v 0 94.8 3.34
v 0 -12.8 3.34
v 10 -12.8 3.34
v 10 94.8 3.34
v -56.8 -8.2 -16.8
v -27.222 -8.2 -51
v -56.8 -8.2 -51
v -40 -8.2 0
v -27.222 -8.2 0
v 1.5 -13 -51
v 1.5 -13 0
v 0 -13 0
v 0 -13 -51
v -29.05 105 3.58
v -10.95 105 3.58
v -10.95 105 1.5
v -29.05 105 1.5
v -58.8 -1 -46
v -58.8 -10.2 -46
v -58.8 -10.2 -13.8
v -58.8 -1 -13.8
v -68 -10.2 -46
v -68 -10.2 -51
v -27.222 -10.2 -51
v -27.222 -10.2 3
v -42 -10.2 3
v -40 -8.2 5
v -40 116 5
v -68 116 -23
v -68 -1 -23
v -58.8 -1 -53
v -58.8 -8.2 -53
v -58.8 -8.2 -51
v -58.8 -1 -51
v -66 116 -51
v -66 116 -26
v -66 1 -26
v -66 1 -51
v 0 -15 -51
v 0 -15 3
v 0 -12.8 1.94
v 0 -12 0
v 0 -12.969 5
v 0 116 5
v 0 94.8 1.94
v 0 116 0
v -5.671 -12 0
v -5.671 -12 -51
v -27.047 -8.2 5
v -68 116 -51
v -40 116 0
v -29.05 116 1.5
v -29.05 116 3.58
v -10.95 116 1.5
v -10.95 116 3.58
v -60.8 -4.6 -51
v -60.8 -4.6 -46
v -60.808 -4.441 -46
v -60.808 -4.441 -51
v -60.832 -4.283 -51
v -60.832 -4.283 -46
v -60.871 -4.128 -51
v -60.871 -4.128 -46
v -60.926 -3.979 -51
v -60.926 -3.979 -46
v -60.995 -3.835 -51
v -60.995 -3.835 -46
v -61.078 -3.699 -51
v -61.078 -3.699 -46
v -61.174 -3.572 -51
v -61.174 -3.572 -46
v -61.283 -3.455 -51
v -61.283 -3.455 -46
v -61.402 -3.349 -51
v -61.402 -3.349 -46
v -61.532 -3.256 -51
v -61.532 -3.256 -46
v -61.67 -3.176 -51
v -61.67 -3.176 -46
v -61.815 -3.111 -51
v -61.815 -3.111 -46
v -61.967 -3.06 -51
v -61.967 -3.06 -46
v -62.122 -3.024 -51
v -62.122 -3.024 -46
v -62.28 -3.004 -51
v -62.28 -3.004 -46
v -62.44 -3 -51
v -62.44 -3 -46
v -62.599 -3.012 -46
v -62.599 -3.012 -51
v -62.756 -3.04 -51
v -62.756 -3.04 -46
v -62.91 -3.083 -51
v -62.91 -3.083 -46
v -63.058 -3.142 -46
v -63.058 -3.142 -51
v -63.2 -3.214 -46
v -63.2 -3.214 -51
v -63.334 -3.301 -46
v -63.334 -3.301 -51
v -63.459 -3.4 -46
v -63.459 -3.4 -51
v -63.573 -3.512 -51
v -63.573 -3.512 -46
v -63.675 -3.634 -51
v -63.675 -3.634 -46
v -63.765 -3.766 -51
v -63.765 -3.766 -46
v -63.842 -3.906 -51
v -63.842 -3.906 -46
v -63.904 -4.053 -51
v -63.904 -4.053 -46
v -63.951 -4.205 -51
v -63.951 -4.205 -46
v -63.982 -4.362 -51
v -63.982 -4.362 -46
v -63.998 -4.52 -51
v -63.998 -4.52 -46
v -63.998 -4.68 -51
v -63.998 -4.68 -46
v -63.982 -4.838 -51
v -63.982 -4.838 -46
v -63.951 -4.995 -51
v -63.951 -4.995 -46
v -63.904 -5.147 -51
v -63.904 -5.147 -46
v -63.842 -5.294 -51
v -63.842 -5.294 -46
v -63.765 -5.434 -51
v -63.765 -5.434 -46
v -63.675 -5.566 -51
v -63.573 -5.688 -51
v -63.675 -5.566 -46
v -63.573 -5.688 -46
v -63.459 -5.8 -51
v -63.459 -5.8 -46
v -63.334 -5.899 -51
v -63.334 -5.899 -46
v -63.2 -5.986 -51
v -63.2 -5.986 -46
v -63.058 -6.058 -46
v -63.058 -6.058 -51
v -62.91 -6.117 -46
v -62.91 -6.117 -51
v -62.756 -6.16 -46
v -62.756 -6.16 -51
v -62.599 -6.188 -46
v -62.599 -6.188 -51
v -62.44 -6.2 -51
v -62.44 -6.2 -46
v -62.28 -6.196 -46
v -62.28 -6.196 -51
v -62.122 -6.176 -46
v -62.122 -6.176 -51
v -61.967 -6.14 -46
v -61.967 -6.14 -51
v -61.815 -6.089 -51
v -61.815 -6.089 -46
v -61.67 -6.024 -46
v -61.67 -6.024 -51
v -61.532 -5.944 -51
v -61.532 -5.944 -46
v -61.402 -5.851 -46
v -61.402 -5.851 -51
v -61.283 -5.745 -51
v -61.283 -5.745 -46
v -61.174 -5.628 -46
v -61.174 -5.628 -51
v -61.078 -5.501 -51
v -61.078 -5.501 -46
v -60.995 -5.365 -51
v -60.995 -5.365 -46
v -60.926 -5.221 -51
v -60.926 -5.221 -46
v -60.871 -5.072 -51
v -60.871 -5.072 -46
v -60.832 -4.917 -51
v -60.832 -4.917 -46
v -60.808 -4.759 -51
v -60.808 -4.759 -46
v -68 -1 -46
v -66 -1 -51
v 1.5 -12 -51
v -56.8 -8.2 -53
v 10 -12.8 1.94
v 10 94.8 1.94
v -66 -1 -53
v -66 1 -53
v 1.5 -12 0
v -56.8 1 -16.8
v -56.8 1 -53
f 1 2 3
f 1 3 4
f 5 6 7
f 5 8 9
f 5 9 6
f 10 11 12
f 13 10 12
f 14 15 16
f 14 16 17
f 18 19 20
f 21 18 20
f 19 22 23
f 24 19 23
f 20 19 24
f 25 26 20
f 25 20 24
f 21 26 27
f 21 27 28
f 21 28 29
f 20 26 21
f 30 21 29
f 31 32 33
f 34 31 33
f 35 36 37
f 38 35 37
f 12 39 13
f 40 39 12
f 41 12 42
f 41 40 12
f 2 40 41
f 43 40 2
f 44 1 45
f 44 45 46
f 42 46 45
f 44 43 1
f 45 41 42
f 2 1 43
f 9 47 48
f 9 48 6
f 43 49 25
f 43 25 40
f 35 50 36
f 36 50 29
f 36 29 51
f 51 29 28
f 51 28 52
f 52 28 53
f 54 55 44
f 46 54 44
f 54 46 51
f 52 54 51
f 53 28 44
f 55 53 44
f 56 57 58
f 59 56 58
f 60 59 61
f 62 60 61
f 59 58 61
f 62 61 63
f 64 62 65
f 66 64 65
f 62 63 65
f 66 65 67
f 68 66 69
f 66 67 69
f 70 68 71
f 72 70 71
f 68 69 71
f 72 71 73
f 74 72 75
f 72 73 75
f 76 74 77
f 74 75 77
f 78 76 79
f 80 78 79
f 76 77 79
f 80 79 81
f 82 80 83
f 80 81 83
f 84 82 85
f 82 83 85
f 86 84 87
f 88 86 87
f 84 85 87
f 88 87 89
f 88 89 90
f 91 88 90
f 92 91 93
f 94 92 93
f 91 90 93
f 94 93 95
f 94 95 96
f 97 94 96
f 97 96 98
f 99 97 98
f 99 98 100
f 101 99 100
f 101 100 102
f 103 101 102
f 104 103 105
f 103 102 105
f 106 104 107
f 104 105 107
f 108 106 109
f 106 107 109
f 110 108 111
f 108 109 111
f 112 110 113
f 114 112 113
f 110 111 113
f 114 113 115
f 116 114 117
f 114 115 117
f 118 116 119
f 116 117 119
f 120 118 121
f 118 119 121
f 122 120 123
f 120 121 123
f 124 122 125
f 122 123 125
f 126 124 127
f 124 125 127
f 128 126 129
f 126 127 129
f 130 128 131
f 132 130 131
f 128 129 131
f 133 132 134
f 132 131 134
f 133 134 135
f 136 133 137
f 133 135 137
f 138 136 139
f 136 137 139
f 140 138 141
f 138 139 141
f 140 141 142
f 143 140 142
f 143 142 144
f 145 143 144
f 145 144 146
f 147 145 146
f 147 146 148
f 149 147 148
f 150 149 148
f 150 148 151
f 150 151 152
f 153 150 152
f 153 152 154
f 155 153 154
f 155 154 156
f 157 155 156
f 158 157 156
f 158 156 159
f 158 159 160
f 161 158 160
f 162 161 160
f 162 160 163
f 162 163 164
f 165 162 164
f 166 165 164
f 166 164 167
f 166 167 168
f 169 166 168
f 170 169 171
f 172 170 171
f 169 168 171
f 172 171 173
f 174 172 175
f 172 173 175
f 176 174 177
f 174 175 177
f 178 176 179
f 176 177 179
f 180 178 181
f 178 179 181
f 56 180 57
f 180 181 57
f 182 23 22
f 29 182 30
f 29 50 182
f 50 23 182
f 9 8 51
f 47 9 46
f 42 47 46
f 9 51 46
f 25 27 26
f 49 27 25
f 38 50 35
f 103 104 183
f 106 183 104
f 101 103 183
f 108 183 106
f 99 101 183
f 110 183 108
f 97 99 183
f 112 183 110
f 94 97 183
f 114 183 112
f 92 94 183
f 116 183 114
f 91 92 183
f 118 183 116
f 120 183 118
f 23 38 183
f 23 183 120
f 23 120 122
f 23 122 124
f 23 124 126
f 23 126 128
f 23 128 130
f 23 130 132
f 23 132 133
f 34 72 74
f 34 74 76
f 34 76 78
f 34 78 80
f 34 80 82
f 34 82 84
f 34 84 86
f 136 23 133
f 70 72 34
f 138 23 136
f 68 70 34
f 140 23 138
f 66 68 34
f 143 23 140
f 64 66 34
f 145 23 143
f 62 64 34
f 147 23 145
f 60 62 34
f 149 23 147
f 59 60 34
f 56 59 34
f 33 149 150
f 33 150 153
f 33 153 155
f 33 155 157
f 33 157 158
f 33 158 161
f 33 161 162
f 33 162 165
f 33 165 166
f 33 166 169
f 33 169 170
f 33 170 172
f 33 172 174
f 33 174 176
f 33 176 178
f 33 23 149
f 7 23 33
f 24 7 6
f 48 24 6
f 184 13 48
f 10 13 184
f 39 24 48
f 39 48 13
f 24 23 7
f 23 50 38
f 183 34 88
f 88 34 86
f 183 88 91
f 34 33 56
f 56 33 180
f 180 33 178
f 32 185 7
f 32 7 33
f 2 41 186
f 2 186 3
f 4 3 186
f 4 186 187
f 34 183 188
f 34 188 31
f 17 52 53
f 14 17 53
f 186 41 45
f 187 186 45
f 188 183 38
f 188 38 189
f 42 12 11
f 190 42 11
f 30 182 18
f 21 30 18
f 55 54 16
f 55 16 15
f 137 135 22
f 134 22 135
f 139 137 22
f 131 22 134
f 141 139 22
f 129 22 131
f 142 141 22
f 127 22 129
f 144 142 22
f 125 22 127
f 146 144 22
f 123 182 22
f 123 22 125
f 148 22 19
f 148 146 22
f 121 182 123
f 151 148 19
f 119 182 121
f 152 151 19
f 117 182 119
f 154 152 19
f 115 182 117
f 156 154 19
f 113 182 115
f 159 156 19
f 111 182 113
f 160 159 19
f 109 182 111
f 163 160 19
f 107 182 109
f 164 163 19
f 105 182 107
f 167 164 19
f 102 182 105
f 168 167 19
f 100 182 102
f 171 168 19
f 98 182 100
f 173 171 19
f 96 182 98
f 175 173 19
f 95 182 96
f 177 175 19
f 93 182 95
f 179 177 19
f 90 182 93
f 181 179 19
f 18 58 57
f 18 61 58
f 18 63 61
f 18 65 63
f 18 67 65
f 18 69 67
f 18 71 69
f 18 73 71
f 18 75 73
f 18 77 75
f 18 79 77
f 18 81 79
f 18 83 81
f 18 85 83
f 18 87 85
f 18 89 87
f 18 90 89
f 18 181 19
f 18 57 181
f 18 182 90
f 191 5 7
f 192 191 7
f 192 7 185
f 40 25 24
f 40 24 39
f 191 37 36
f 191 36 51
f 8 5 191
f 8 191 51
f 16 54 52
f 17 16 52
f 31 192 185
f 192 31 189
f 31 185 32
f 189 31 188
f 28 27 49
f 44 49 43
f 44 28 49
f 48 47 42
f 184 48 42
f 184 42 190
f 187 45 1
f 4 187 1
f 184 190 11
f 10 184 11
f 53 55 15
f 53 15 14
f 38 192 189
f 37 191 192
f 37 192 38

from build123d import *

# Parameters (mm, degrees)
SKETCH_1_W      = 40
SKETCH_1_H      = 116
PAD_DEPTH       = 5
PAD001_DEPTH    = 5
PAD002_DEPTH    = 126.2
SKETCH005_W     = 9.2
SKETCH005_H     = 9.2
POCKET_DEPTH    = 33.001
PAD004_DEPTH    = 2
PAD005_DEPTH    = 51
SKETCH006_W     = 2
SKETCH006_H     = 117
PAD006_DEPTH    = 23
PAD007_DEPTH    = 2
PAD008_DEPTH    = 9.2
SKETCH009_W     = 9.2
SKETCH009_H     = 5
PAD009_DEPTH    = 9.2
SKETCH010_R     = 1.6
POCKET001_DEPTH = 5
SKETCH011_W     = 107.6
SKETCH011_H     = 1.4
PAD010_DEPTH    = 10
SKETCH012_W     = 18.1
SKETCH012_H     = 2.08
POCKET002_DEPTH = 11
CHAMFER_SIZE    = 2
PAD011_DEPTH    = 51


with BuildPart() as part:
    # Sketch_1 → Pad (new body)
    with BuildSketch(Plane.XY):
        with Locations((-20, 58)):
            Rectangle(SKETCH_1_W, SKETCH_1_H)
    extrude(amount=PAD_DEPTH)

    # Sketch → Pad001 (join)
    with BuildSketch(Plane.XY):
        Polygon((0, 0), (-40, 0), (-40, -10.2), (-27.222153, -10.2), (0, -15), align=None)
    extrude(amount=PAD001_DEPTH)

    # Sketch001 (on Face6 of Pad001) → Pad002 (join)
    with BuildSketch(Plane.XZ.offset(10.2)):
        Polygon((-40, 5), (-68, -23), (-68, -28), (-66, -28), (-66, -26), (-40, 0), align=None)
    extrude(amount=-PAD002_DEPTH)

    # Sketch005 (on Face13 of Pad002) → Pocket (cut, through all)
    with BuildSketch(Plane.XY.offset(5)):
        with Locations((-63.4, -5.6)):
            Rectangle(SKETCH005_W, SKETCH005_H)
    extrude(amount=-POCKET_DEPTH, mode=Mode.SUBTRACT)

    # Sketch003 → Pad004 (join)
    with BuildSketch(Plane.XZ.offset(10.2)):
        Polygon((-58.8, -51), (-58.8, -18.8), (-40, 0), (-27.222153, 0), (-27.222153, -51), align=None)
    extrude(amount=-PAD004_DEPTH)

    # Sketch004 (on Face12 of Pad004) → Pad005 (join)
    with BuildSketch(Plane(origin=(0, 0, 0), x_dir=(1, 0, 0), z_dir=(0, 0, -1))):
        Polygon((-27.222153, 10.2), (0, 15), (0, 13), (-27.222153, 8.2), align=None)
    extrude(amount=PAD005_DEPTH)

    # Sketch006 (on Face8 of Pad005) → Pad006 (join)
    with BuildSketch(Plane(origin=(0, 0, -28), x_dir=(1, 0, 0), z_dir=(0, 0, -1))):
        with Locations((-67, -57.5)):
            Rectangle(SKETCH006_W, SKETCH006_H)
    extrude(amount=PAD006_DEPTH)

    # Sketch007 (on Face27 of Pad006) → Pad007 (join)
    with BuildSketch(Plane.XZ.offset(1)):
        Polygon((-58.8, -18.8), (-66, -26), (-66, -53), (-58.8, -53), align=None)
    extrude(amount=-PAD007_DEPTH)

    # Sketch008 (on Face22 of Pad007) → Pad008 (join)
    with BuildSketch(Plane(origin=(0, -8.2, 0), x_dir=(-1, 0, 0), z_dir=(0, 1, 0))):
        Polygon((56.8, -16.8), (56.8, -53), (58.8, -53), (58.8, -18.8), align=None)
    extrude(amount=PAD008_DEPTH)

    # Sketch009 (on Face32 of Pad008) → Pad009 (join)
    with BuildSketch(Plane.XZ.offset(1)):
        with Locations((-63.4, -48.5)):
            Rectangle(SKETCH009_W, SKETCH009_H)
    extrude(amount=PAD009_DEPTH)

    # Sketch010 (on Face43 of Pad009) → Pocket001 (cut)
    with BuildSketch(Plane.XY.offset(-46)):
        with Locations((-62.4, -4.6)):
            Circle(SKETCH010_R)
    extrude(amount=-POCKET001_DEPTH, mode=Mode.SUBTRACT)

    # Sketch011 (on Face3 of Pocket001) → Pad010 (join)
    with BuildSketch(Plane.YZ):
        with Locations((41, 2.64)):
            Rectangle(SKETCH011_W, SKETCH011_H)
    extrude(amount=PAD010_DEPTH)

    # Sketch012 (on Face1 of Pad010) → Pocket002 (cut)
    with BuildSketch(Plane(origin=(0, 116, 0), x_dir=(-1, 0, 0), z_dir=(0, 1, 0))):
        with Locations((20, 2.54)):
            Rectangle(SKETCH012_W, SKETCH012_H)
    extrude(amount=-POCKET002_DEPTH, mode=Mode.SUBTRACT)

    # Chamfer
    chamfer_edges = [part.edges().sort_by_distance(p)[0] for p in [
        (-13.611076, -12.6, 5),
        (-33.611076, -10.2, 5),
    ]]
    chamfer(chamfer_edges, length=CHAMFER_SIZE)

    # Sketch013 (on Face32 of Chamfer) → Pad011 (join)
    with BuildSketch(Plane(origin=(0, 0, 0), x_dir=(1, 0, 0), z_dir=(0, 0, -1))):
        Polygon((-5.671282, 12), (1.5, 12), (1.5, 13), (0, 13), align=None)
    extrude(amount=PAD011_DEPTH)


solid = part.part
